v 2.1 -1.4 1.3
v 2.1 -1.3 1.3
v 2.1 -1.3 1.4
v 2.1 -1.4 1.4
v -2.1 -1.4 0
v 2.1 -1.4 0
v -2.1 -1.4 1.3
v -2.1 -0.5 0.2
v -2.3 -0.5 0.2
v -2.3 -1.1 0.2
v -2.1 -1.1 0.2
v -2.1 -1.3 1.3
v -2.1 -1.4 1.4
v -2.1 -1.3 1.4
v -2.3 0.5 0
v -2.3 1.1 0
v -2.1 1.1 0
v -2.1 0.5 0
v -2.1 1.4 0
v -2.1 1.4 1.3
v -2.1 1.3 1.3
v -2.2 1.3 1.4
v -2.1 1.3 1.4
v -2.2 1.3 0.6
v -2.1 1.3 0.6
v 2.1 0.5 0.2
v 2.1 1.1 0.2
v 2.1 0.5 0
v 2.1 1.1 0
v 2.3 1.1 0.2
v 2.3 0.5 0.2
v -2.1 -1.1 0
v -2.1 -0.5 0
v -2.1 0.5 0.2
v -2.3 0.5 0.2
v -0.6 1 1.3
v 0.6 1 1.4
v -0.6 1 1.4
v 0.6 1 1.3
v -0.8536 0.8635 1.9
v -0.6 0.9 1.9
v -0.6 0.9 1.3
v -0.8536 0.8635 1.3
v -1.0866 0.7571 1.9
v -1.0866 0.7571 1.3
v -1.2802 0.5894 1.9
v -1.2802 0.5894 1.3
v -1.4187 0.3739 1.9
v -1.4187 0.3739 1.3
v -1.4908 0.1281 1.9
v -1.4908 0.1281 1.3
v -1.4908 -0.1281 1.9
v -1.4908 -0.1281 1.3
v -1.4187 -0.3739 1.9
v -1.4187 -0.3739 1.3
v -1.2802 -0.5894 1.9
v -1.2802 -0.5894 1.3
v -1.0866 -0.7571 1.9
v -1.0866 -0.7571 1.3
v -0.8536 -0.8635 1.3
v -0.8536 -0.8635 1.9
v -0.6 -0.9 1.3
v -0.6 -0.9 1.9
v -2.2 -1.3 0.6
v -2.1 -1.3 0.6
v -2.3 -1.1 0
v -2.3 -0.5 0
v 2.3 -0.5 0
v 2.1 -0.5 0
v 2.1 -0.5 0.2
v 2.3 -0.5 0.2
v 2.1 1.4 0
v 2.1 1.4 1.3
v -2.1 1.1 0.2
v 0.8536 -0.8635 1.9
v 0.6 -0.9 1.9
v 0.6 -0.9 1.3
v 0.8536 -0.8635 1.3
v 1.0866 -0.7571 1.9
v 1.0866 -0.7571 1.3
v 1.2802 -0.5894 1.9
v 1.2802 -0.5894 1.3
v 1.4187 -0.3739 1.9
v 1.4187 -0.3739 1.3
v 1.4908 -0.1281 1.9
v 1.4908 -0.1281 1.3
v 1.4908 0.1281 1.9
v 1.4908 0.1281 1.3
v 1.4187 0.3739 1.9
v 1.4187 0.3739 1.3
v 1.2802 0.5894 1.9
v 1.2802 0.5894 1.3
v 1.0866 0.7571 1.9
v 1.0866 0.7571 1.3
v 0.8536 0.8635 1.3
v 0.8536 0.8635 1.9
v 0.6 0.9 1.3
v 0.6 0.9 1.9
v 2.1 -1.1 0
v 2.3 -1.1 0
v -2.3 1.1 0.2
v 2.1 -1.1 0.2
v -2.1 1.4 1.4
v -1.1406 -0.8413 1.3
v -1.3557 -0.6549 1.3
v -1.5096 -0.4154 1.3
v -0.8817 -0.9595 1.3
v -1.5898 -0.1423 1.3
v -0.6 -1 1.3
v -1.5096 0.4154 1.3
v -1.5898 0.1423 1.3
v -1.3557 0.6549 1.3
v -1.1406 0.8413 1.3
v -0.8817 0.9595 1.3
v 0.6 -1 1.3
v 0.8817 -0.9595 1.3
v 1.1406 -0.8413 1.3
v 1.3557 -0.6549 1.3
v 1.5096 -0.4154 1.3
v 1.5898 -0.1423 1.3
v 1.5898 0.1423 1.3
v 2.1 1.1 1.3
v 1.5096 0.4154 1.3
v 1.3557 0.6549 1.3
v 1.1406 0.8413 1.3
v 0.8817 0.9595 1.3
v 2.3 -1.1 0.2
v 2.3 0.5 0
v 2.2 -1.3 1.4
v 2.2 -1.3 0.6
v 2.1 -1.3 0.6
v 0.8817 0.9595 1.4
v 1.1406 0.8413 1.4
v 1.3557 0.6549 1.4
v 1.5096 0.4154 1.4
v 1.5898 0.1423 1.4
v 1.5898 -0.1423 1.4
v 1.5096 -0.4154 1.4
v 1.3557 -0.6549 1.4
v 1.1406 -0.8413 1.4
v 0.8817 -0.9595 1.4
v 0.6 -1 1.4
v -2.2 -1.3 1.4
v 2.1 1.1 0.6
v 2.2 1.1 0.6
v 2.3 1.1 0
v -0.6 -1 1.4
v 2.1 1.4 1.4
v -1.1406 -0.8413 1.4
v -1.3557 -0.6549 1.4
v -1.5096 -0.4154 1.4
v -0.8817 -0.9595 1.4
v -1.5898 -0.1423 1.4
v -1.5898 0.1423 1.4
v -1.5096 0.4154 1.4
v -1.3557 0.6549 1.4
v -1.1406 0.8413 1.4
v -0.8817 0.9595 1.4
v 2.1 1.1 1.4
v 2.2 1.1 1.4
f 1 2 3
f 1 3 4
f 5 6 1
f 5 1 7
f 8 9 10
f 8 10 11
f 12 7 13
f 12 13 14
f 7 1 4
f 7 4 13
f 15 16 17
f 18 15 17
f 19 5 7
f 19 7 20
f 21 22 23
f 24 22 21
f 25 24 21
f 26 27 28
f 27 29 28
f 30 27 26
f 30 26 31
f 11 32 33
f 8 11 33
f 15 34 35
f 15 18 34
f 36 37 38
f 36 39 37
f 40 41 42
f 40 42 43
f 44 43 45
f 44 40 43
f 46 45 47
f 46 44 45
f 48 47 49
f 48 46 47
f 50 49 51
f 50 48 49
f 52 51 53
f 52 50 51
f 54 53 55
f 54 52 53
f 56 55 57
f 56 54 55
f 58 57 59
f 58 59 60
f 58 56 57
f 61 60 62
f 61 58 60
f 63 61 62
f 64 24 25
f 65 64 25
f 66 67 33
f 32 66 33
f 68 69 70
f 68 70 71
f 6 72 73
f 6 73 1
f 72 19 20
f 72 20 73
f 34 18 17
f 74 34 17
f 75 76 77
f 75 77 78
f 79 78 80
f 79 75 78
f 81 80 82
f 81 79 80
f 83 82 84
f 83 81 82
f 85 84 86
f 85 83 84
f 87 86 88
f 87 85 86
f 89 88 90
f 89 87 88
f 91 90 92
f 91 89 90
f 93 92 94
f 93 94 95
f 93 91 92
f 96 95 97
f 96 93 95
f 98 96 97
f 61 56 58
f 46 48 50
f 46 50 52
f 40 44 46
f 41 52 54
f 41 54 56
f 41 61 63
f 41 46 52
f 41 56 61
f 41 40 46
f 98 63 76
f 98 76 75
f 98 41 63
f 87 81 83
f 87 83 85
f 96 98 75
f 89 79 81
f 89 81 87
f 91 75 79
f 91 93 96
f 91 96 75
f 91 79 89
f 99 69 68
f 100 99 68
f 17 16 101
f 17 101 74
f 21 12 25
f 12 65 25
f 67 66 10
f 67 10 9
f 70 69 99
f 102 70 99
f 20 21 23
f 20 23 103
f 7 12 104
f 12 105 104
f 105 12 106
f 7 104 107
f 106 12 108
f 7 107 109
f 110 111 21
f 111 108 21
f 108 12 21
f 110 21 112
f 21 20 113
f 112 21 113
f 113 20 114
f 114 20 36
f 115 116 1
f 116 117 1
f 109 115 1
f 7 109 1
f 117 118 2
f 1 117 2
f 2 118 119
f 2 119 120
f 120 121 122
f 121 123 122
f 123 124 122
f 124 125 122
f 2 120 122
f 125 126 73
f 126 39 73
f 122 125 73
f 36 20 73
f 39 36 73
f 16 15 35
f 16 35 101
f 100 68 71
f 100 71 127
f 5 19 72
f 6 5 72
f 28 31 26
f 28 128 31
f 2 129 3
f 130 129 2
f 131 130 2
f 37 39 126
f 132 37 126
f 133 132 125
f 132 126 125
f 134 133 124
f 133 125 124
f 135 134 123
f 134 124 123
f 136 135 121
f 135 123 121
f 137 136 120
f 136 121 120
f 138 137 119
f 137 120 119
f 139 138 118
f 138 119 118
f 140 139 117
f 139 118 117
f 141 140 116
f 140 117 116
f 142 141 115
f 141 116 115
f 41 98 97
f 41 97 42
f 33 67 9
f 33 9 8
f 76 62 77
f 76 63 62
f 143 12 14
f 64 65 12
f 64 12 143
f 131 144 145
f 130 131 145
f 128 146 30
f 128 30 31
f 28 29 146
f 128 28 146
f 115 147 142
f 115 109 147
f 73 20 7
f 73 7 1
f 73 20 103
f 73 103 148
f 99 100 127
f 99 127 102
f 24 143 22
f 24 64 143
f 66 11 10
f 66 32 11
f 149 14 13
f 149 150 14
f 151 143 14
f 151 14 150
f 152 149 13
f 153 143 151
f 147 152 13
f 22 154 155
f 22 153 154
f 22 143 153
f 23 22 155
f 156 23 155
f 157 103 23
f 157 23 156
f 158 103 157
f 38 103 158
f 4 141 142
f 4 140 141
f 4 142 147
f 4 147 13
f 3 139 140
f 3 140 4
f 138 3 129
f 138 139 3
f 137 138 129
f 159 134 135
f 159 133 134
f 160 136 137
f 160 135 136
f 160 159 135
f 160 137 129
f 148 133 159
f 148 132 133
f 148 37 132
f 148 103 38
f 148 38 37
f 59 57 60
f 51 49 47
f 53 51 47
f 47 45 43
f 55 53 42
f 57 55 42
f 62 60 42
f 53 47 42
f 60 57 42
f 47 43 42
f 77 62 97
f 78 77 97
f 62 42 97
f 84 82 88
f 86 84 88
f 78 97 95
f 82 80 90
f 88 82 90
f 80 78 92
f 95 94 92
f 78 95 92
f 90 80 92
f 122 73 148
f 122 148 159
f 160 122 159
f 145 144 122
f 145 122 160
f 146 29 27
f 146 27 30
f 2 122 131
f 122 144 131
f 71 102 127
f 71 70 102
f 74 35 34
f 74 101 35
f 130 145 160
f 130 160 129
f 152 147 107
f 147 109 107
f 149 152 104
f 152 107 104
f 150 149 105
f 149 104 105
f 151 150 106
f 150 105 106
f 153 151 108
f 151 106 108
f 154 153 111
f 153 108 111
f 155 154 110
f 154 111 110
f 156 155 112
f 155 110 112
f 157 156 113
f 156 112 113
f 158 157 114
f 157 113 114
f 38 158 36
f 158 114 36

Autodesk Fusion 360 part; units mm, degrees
sketch "Sketch1" plane through (0, 0, 0) normal (0, 0, 1) x (1, 0, 0) in component "Tactile Microminiature CK KMR2"
  line L0 (-0.6, -1) -> (0.6, -1)
  arc A0 (0.6, -1) -> (0.6, 1) centre (0.6, 0) ccw
  line L1 (0.6, 1) -> (-0.6, 1)
  arc A1 (-0.6, 1) -> (-0.6, -1) centre (-0.6, 0) ccw
  line L2 (-0.6, 0) -> (0.6, 0) construction
  line L3 (0.6, 0.9) -> (-0.6, 0.9)
  arc A2 (-0.6, 0.9) -> (-0.6, -0.9) centre (-0.6, 0) ccw
  line L4 (-0.6, -0.9) -> (0.6, -0.9)
  arc A3 (0.6, -0.9) -> (0.6, 0.9) centre (0.6, 0) ccw
  line L5 (-2.2, 1.3) -> (-2.1, 1.3)
  line L6 (-2.1, -1.3) -> (-2.2, -1.3)
  line L7 (-2.2, -1.3) -> (-2.2, 1.3)
  line L8 (2.1, 1.3) -> (2.2, 1.3)
  line L9 (2.2, 1.3) -> (2.2, -1.3)
  line L10 (2.2, -1.3) -> (2.1, -1.3)
  line L11 (2.1, -1.4) -> (-2.1, -1.4)
  line L12 (-2.1, -1.4) -> (-2.1, 1.4)
  line L13 (-2.1, 1.4) -> (2.1, 1.4)
  line L14 (2.1, 1.4) -> (2.1, -1.4)
  line L15 (2.3, -0.5) -> (2.3, -1.1)
  line L16 (-2.3, -1.1) -> (-2.3, -0.5)
  line L17 (2.3, 1.1) -> (2.3, 0.5)
  line L18 (-2.3, 0.5) -> (-2.3, 1.1)
  line L19 (-2.3, 1.1) -> (-2.1, 1.1)
  line L20 (2.1, 1.1) -> (2.3, 1.1)
  line L21 (-2.1, 0.5) -> (-2.3, 0.5)
  line L22 (2.3, 0.5) -> (2.1, 0.5)
  line L23 (2.1, -0.5) -> (2.3, -0.5)
  line L24 (2.3, -1.1) -> (2.1, -1.1)
  line L25 (-2.1, -1.1) -> (-2.3, -1.1)
  line L26 (-2.3, -0.5) -> (-2.1, -0.5)
  dimension "d4" = -0.1
  dimension "d20" = 2.8
extrude "Extrude2" add sketch "Sketch1" along normal blind 1.4 and the other way blind -1.3 contours L11 L12 L13 L14 makes body 1 in component "Tactile Microminiature CK KMR2"
extrude "Extrude3" add sketch "Sketch1" along normal blind 1.4 and the other way blind -0.6 contours L5 L7 L12 L19 | L7 L12 L19 L21 | L7 L12 L21 L26 | L7 L12 L25 L26 | L6 L7 L12 L25 | L9 L14 L20 L22 | L9 L14 L22 L23 | L9 L14 L23 L24 | L9 L10 L14 L24 bodies 1 in component "Tactile Microminiature CK KMR2"
extrude "Extrude4" add sketch "Sketch1" along normal blind 1.3 and the other way blind -1.9 separate body contours L3 A2 L4 A3 makes body 2 in component "Tactile Microminiature CK KMR2"
extrude "Extrude5" add sketch "Sketch1" along normal blind 1.3 separate body contours L0 A0 L1 A1 | L3 A2 L4 A3 | L11 L12 L13 L14 makes body 3 in component "Tactile Microminiature CK KMR2"
extrude "Extrude6" add sketch "Sketch1" along normal blind 0.2 separate body contours L7 L12 L19 L21 | L7 L18 L19 L21 | L7 L12 L25 L26 | L7 L16 L25 L26 | L9 L14 L20 L22 | L9 L17 L20 L22 | L9 L14 L23 L24 | L9 L15 L23 L24 makes body 4 at (-2.1667, 0.7, 0) makes body 5 at (2.3, 0.9, 0.0667) makes body 6 at (-2.1667, -0.9, 0) makes body 7 at (2.3, -0.7, 0.0667) in component "Tactile Microminiature CK KMR2"
component "Tactile Microminiature CK KMR2" placed x (1, 0, 0) y (0, 1, 0) z (0, 0, 1) at (0, 0, 0)
equation "d10 = Side2TaperAngle"
equation "d14 = Side2TaperAngle"
equation "d18 = Side2TaperAngle"
